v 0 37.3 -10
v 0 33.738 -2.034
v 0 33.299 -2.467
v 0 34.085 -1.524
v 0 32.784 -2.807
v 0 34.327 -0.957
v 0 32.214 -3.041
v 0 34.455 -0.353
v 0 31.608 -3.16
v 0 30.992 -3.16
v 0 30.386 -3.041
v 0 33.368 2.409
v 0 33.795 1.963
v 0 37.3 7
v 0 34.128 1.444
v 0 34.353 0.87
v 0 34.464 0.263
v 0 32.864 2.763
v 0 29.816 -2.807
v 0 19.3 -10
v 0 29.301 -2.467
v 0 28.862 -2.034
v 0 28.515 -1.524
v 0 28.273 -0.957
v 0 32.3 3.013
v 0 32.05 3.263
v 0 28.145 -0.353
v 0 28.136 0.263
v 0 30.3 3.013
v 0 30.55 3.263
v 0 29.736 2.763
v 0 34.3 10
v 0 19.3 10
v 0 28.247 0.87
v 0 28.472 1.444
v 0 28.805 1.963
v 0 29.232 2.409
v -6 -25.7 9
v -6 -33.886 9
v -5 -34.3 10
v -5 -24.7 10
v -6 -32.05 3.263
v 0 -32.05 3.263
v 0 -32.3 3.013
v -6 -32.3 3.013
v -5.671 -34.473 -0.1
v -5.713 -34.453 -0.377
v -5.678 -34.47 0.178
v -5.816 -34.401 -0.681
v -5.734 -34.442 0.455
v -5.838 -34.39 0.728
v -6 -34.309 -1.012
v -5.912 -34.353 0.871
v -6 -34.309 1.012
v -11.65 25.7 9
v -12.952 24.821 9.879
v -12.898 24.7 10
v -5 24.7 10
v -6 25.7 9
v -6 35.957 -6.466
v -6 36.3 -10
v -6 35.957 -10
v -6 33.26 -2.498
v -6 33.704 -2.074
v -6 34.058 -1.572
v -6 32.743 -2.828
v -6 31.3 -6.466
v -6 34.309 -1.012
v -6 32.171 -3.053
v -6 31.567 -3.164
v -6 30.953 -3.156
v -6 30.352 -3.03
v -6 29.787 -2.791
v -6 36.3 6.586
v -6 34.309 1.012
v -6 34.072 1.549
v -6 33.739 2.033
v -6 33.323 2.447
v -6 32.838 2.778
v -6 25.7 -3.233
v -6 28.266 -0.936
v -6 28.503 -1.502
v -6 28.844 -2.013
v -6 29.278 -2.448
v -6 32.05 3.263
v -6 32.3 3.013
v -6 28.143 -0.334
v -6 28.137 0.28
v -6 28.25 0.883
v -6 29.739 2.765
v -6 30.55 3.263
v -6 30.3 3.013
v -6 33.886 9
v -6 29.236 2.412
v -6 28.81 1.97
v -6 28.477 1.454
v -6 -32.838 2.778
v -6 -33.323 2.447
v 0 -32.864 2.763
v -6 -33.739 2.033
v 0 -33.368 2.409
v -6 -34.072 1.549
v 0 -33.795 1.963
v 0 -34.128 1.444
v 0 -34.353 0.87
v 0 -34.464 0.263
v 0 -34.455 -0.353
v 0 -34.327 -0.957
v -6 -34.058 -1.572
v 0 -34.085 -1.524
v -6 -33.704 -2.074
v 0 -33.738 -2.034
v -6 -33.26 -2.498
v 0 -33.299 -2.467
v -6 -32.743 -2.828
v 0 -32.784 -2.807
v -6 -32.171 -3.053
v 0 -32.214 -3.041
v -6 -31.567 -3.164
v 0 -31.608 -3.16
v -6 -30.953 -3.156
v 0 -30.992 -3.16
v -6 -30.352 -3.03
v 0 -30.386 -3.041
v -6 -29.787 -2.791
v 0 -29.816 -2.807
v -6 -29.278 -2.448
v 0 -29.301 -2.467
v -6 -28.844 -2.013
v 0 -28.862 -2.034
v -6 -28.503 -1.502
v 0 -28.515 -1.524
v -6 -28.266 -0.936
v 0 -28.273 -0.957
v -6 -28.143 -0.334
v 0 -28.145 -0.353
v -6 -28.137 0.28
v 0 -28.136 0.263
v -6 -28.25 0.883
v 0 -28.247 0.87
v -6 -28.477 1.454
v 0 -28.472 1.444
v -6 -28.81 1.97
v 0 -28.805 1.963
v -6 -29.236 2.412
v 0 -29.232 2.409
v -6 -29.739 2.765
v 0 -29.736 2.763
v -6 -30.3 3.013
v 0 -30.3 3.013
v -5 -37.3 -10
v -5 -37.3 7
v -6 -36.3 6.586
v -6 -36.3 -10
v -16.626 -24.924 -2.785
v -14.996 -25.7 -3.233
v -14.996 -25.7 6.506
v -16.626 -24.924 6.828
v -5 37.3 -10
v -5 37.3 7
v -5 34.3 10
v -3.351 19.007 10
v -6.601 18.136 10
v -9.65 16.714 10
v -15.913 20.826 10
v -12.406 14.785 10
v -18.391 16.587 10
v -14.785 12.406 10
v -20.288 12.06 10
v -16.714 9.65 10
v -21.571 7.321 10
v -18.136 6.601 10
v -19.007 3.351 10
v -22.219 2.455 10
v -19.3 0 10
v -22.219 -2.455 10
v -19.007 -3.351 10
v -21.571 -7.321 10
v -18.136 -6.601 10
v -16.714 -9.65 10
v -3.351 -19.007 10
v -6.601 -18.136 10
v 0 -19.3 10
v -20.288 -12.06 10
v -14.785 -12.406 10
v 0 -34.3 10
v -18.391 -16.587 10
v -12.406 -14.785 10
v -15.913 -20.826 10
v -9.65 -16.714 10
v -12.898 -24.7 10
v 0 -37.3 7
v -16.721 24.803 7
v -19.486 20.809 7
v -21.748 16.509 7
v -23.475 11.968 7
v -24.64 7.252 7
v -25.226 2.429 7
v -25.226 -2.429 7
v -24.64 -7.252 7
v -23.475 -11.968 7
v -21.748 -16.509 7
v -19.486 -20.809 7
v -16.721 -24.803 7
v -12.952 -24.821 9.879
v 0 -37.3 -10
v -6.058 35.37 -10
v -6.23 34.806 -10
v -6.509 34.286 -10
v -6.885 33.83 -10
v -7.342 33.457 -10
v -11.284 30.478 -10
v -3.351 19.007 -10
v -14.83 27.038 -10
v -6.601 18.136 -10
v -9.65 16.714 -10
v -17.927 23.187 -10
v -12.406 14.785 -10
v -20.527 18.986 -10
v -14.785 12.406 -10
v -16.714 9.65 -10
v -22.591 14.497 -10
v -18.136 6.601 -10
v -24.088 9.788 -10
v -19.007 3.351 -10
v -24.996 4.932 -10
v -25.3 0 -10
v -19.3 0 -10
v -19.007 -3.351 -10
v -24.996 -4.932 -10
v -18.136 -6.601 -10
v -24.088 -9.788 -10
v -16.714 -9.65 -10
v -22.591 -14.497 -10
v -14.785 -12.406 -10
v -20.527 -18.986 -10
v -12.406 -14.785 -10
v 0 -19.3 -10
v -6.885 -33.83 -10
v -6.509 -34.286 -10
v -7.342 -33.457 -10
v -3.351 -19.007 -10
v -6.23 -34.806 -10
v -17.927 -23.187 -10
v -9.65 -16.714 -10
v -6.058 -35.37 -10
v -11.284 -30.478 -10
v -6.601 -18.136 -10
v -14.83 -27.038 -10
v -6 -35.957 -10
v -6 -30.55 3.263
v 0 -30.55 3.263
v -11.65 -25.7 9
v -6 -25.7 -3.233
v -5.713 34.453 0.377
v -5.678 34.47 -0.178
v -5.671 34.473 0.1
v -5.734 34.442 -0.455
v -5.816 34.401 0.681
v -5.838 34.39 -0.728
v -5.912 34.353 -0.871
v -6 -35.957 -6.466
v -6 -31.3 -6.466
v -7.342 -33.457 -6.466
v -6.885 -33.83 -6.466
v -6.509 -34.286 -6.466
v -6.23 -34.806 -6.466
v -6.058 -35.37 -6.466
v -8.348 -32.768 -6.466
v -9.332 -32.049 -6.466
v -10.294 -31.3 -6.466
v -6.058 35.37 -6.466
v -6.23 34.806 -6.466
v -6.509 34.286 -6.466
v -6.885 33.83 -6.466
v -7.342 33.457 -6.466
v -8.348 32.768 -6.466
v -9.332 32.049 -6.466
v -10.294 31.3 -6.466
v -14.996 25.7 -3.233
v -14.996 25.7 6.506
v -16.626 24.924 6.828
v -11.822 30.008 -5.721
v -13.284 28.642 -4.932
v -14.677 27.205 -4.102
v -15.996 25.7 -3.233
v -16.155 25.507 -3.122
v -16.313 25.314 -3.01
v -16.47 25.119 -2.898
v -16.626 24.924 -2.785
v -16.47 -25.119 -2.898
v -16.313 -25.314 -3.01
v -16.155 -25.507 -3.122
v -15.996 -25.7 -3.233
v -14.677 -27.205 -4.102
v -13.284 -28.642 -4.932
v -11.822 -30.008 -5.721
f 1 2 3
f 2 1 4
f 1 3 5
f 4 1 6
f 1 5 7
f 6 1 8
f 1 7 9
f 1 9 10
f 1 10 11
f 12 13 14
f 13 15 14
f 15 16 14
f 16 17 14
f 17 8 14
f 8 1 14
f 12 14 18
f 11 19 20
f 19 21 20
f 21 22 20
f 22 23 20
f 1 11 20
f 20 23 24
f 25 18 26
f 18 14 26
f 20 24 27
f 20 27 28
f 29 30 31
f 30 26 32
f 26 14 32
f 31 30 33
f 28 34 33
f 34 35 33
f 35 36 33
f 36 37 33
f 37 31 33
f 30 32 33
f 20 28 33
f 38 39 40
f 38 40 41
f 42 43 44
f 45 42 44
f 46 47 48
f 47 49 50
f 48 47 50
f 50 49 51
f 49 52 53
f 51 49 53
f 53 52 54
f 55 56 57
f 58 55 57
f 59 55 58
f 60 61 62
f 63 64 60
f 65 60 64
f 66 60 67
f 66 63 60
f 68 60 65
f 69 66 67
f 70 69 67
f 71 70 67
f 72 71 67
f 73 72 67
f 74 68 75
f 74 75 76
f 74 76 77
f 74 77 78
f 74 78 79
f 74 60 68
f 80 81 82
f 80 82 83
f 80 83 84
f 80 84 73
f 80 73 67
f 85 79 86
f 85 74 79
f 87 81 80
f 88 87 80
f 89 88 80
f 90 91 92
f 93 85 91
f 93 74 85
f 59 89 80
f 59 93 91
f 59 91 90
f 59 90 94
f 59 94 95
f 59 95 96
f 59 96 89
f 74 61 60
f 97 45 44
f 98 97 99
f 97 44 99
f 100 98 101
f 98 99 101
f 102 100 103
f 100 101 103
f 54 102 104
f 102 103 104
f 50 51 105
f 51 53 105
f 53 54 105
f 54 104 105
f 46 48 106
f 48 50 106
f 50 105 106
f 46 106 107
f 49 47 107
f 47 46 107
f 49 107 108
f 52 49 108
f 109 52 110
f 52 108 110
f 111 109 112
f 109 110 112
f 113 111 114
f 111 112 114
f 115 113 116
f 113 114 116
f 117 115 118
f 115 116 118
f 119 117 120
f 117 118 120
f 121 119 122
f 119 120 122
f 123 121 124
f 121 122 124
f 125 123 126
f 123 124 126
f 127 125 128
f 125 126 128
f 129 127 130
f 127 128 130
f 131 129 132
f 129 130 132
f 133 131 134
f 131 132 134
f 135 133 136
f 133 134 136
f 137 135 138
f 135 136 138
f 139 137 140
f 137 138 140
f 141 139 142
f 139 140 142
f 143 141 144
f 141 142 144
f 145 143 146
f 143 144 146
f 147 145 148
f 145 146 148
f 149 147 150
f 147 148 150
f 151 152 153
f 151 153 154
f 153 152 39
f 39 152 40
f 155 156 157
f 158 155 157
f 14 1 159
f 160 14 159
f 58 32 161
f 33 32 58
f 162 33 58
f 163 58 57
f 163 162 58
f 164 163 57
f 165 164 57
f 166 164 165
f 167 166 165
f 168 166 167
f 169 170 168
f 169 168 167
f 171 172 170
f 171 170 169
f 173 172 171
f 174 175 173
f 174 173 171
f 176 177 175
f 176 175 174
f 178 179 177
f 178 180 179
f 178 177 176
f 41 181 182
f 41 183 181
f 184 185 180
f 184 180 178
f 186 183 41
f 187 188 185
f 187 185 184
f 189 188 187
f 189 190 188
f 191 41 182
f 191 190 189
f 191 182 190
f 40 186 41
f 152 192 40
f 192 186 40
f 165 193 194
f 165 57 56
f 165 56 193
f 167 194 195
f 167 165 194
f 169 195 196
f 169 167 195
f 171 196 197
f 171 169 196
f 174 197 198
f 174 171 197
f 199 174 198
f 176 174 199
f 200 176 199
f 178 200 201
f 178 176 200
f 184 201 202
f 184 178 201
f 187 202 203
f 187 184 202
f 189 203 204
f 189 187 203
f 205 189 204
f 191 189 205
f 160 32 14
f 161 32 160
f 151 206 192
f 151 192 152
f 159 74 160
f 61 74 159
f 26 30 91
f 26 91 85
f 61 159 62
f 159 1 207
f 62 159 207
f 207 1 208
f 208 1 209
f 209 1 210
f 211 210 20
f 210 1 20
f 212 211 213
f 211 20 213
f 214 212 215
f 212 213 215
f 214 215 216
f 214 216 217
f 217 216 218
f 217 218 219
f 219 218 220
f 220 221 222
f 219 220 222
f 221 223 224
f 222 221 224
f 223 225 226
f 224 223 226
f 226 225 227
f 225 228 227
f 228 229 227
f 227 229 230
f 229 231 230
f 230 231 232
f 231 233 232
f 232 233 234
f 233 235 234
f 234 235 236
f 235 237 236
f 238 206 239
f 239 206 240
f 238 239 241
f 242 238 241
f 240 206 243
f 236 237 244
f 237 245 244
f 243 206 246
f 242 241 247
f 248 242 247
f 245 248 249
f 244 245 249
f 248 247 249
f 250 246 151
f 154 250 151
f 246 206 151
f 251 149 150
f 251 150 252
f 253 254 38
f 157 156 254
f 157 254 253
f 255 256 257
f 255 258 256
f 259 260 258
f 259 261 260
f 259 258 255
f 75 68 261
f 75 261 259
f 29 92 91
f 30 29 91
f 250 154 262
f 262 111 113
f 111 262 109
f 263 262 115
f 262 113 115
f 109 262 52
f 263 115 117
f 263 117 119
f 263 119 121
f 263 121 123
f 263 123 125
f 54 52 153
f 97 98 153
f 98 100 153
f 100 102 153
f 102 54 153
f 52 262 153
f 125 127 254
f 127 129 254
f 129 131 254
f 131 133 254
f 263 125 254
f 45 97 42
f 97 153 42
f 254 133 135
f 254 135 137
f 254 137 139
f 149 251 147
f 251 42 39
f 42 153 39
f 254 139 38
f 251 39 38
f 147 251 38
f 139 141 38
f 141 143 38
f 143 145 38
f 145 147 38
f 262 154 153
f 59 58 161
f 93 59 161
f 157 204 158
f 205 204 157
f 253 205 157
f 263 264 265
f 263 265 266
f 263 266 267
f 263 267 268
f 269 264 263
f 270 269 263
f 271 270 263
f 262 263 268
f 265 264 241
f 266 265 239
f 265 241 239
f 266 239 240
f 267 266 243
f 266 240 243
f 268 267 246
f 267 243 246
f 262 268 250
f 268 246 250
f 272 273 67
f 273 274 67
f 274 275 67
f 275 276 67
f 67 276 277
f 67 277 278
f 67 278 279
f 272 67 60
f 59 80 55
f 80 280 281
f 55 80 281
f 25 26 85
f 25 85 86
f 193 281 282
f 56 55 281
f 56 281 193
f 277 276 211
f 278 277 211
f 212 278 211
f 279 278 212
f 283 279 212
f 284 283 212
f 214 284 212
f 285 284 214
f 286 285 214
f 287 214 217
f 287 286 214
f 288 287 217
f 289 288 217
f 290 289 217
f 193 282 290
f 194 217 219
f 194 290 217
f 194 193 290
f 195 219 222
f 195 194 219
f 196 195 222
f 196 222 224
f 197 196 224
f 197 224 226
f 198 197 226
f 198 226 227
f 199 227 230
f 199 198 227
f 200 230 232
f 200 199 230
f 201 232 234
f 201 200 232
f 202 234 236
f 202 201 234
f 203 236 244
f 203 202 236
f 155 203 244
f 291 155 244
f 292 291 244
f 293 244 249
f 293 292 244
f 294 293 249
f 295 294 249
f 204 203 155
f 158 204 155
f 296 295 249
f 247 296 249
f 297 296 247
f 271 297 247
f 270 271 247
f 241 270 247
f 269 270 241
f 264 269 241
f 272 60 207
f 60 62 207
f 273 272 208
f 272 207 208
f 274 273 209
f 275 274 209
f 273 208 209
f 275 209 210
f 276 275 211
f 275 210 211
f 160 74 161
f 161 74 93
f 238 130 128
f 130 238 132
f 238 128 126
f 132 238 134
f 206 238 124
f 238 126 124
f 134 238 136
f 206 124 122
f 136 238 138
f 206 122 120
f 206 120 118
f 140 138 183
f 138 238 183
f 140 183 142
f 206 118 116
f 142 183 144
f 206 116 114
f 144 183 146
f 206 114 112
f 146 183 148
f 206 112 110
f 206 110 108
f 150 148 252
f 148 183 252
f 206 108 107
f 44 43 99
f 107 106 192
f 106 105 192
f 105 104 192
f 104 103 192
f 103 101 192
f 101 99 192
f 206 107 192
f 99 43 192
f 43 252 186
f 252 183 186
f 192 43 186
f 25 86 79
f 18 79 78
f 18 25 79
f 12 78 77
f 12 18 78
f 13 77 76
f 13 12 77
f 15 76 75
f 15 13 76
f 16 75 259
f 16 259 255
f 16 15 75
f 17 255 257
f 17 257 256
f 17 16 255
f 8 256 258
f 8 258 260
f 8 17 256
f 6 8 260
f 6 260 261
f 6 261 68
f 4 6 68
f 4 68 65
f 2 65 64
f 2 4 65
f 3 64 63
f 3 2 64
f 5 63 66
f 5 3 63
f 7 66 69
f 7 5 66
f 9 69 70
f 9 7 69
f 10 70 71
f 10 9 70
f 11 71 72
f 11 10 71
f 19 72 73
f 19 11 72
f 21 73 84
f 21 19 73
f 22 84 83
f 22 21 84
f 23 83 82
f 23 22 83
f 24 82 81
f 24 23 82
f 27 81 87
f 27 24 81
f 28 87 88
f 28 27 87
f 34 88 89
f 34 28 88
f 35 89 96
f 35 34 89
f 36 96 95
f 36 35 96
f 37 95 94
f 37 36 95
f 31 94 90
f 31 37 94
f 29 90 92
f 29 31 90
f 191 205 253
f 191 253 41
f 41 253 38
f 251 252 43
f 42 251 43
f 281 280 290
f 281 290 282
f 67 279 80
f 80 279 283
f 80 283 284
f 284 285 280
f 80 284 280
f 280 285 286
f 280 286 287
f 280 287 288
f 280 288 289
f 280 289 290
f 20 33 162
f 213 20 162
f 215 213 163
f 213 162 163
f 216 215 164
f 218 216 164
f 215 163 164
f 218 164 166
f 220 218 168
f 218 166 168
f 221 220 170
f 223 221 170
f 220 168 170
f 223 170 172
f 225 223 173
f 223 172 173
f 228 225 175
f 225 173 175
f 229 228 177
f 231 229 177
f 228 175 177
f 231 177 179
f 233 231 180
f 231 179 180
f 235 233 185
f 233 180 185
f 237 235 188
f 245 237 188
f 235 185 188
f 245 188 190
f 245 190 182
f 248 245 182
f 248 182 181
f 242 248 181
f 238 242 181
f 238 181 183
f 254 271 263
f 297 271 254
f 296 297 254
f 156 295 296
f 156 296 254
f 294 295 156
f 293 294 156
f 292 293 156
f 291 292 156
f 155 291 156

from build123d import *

# Parameters (mm, degrees)
PAD008_DEPTH    = 10
SKETCH029_R     = 3.175
POCKET018_DEPTH = 187.8463782794
POCKET019_DEPTH = 187.8463789695
POCKET020_DEPTH = 19
PAD009_DEPTH    = 20
CHAMFER007_SIZE = 3
CHAMFER008_SIZE = 1
FILLET002_R     = 3


with BuildPart() as part:
    # Sketch028 → Pad008 (new body, symmetric)
    with BuildSketch(Plane.XY):
        with BuildLine():
            ThreePointArc((0, 19.3), (-19.3, 0), (0, -19.3))
            Line((0, -19.3), (0, -37.3))
            ThreePointArc((0, 37.3), (-25.3, 0), (0, -37.3))
            Line((0, 37.3), (0, 19.3))
        make_face()
    extrude(amount=PAD008_DEPTH, both=True)

    # Sketch029 (on Face3 of Pad008) → Pocket018 (cut, through all)
    with BuildSketch(Plane.YZ):
        with Locations((-31.3, 0)):
            Circle(SKETCH029_R)
    pocket018 = extrude(amount=-POCKET018_DEPTH, mode=Mode.SUBTRACT)

    # Mirrored018: Pocket018 across Sketch029 V_Axis
    add(pocket018.mirror(Plane(origin=(0, 0, 0), x_dir=(1, 0, 0), z_dir=(0, 1, 0))), mode=Mode.SUBTRACT)

    # Sketch030 (on Face7 of Mirrored018) → Pocket019 (cut, through all)
    with BuildSketch(Plane.YZ):
        Polygon((-32.3, 3.0134075396), (-30.3, 3.0134075396), (-30.55, 3.2634075396), (-32.05, 3.2634075396), align=None)
    pocket019 = extrude(amount=-POCKET019_DEPTH, mode=Mode.SUBTRACT)

    # Mirrored019: Pocket019 across Sketch030 V_Axis
    add(pocket019.mirror(Plane(origin=(0, 0, 0), x_dir=(1, 0, 0), z_dir=(0, 1, 0))), mode=Mode.SUBTRACT)

    # Sketch031 (on DatumPlane) → Pocket020 (cut)
    with BuildSketch(Plane(origin=(-25, 0, 0), x_dir=(0, -1, 0), z_dir=(-1, 0, 0))):
        Polygon((25.7, -3.2331615075), (25.7, 10), (37.3, 10), (37.3, -6.4663230149), (31.3, -6.4663230149), align=None)
    pocket020 = extrude(amount=-POCKET020_DEPTH, mode=Mode.SUBTRACT)

    # Mirrored020: Pocket020 across Sketch031 V_Axis
    add(pocket020.mirror(Plane(origin=(-25, 0, 0), x_dir=(-1, 0, 0), z_dir=(0, -1, 0))), mode=Mode.SUBTRACT)

    # Sketch032 (on Face4 of Mirrored020) → Pad009 (join)
    with BuildSketch(Plane.XY.offset(10)):
        Polygon((0, -37.3), (-6, -37.3), (-6, -34.3094710302), align=None)
    pad009 = extrude(amount=-PAD009_DEPTH)

    # Mirrored021: Pad009 across Sketch032 H_Axis
    add(pad009.mirror(Plane(origin=(0, 0, 10), x_dir=(0, 0, 1), z_dir=(0, 1, 0))))

    # Chamfer007
    chamfer007_edges = [part.edges().sort_by_distance(p)[0] for p in [
        (-3, -37.3, 10),
        (-25.3, 0, 10),
        (-3, 37.3, 10),
    ]]
    chamfer(chamfer007_edges, length=CHAMFER007_SIZE)

    # Chamfer008
    chamfer008_edges = [part.edges().sort_by_distance(p)[0] for p in [
        (-6, -37.3, -1.5),
        (-6, -35.8, 8.5),
        (-6, -30, 10),
        (-8.987185, -25.7, 10),
        (-13.996133, -25.7, 8.514904),
        (-15.995669, -25.7, 1.883419),
        (-15.995669, 25.7, 1.883419),
        (-13.996133, 25.7, 8.514904),
        (-8.987185, 25.7, 10),
        (-6, 30, 10),
        (-6, 35.8, 8.5),
        (-6, 37.3, -1.5),
    ]]
    chamfer(chamfer008_edges, length=CHAMFER008_SIZE)

    # Fillet002
    fillet002_edges = [part.edges().sort_by_distance(p)[0] for p in [
        (-6, 34.309471, -8.233162),
        (-6, -34.309471, -8.233162),
    ]]
    fillet(fillet002_edges, radius=FILLET002_R)


solid = part.part
